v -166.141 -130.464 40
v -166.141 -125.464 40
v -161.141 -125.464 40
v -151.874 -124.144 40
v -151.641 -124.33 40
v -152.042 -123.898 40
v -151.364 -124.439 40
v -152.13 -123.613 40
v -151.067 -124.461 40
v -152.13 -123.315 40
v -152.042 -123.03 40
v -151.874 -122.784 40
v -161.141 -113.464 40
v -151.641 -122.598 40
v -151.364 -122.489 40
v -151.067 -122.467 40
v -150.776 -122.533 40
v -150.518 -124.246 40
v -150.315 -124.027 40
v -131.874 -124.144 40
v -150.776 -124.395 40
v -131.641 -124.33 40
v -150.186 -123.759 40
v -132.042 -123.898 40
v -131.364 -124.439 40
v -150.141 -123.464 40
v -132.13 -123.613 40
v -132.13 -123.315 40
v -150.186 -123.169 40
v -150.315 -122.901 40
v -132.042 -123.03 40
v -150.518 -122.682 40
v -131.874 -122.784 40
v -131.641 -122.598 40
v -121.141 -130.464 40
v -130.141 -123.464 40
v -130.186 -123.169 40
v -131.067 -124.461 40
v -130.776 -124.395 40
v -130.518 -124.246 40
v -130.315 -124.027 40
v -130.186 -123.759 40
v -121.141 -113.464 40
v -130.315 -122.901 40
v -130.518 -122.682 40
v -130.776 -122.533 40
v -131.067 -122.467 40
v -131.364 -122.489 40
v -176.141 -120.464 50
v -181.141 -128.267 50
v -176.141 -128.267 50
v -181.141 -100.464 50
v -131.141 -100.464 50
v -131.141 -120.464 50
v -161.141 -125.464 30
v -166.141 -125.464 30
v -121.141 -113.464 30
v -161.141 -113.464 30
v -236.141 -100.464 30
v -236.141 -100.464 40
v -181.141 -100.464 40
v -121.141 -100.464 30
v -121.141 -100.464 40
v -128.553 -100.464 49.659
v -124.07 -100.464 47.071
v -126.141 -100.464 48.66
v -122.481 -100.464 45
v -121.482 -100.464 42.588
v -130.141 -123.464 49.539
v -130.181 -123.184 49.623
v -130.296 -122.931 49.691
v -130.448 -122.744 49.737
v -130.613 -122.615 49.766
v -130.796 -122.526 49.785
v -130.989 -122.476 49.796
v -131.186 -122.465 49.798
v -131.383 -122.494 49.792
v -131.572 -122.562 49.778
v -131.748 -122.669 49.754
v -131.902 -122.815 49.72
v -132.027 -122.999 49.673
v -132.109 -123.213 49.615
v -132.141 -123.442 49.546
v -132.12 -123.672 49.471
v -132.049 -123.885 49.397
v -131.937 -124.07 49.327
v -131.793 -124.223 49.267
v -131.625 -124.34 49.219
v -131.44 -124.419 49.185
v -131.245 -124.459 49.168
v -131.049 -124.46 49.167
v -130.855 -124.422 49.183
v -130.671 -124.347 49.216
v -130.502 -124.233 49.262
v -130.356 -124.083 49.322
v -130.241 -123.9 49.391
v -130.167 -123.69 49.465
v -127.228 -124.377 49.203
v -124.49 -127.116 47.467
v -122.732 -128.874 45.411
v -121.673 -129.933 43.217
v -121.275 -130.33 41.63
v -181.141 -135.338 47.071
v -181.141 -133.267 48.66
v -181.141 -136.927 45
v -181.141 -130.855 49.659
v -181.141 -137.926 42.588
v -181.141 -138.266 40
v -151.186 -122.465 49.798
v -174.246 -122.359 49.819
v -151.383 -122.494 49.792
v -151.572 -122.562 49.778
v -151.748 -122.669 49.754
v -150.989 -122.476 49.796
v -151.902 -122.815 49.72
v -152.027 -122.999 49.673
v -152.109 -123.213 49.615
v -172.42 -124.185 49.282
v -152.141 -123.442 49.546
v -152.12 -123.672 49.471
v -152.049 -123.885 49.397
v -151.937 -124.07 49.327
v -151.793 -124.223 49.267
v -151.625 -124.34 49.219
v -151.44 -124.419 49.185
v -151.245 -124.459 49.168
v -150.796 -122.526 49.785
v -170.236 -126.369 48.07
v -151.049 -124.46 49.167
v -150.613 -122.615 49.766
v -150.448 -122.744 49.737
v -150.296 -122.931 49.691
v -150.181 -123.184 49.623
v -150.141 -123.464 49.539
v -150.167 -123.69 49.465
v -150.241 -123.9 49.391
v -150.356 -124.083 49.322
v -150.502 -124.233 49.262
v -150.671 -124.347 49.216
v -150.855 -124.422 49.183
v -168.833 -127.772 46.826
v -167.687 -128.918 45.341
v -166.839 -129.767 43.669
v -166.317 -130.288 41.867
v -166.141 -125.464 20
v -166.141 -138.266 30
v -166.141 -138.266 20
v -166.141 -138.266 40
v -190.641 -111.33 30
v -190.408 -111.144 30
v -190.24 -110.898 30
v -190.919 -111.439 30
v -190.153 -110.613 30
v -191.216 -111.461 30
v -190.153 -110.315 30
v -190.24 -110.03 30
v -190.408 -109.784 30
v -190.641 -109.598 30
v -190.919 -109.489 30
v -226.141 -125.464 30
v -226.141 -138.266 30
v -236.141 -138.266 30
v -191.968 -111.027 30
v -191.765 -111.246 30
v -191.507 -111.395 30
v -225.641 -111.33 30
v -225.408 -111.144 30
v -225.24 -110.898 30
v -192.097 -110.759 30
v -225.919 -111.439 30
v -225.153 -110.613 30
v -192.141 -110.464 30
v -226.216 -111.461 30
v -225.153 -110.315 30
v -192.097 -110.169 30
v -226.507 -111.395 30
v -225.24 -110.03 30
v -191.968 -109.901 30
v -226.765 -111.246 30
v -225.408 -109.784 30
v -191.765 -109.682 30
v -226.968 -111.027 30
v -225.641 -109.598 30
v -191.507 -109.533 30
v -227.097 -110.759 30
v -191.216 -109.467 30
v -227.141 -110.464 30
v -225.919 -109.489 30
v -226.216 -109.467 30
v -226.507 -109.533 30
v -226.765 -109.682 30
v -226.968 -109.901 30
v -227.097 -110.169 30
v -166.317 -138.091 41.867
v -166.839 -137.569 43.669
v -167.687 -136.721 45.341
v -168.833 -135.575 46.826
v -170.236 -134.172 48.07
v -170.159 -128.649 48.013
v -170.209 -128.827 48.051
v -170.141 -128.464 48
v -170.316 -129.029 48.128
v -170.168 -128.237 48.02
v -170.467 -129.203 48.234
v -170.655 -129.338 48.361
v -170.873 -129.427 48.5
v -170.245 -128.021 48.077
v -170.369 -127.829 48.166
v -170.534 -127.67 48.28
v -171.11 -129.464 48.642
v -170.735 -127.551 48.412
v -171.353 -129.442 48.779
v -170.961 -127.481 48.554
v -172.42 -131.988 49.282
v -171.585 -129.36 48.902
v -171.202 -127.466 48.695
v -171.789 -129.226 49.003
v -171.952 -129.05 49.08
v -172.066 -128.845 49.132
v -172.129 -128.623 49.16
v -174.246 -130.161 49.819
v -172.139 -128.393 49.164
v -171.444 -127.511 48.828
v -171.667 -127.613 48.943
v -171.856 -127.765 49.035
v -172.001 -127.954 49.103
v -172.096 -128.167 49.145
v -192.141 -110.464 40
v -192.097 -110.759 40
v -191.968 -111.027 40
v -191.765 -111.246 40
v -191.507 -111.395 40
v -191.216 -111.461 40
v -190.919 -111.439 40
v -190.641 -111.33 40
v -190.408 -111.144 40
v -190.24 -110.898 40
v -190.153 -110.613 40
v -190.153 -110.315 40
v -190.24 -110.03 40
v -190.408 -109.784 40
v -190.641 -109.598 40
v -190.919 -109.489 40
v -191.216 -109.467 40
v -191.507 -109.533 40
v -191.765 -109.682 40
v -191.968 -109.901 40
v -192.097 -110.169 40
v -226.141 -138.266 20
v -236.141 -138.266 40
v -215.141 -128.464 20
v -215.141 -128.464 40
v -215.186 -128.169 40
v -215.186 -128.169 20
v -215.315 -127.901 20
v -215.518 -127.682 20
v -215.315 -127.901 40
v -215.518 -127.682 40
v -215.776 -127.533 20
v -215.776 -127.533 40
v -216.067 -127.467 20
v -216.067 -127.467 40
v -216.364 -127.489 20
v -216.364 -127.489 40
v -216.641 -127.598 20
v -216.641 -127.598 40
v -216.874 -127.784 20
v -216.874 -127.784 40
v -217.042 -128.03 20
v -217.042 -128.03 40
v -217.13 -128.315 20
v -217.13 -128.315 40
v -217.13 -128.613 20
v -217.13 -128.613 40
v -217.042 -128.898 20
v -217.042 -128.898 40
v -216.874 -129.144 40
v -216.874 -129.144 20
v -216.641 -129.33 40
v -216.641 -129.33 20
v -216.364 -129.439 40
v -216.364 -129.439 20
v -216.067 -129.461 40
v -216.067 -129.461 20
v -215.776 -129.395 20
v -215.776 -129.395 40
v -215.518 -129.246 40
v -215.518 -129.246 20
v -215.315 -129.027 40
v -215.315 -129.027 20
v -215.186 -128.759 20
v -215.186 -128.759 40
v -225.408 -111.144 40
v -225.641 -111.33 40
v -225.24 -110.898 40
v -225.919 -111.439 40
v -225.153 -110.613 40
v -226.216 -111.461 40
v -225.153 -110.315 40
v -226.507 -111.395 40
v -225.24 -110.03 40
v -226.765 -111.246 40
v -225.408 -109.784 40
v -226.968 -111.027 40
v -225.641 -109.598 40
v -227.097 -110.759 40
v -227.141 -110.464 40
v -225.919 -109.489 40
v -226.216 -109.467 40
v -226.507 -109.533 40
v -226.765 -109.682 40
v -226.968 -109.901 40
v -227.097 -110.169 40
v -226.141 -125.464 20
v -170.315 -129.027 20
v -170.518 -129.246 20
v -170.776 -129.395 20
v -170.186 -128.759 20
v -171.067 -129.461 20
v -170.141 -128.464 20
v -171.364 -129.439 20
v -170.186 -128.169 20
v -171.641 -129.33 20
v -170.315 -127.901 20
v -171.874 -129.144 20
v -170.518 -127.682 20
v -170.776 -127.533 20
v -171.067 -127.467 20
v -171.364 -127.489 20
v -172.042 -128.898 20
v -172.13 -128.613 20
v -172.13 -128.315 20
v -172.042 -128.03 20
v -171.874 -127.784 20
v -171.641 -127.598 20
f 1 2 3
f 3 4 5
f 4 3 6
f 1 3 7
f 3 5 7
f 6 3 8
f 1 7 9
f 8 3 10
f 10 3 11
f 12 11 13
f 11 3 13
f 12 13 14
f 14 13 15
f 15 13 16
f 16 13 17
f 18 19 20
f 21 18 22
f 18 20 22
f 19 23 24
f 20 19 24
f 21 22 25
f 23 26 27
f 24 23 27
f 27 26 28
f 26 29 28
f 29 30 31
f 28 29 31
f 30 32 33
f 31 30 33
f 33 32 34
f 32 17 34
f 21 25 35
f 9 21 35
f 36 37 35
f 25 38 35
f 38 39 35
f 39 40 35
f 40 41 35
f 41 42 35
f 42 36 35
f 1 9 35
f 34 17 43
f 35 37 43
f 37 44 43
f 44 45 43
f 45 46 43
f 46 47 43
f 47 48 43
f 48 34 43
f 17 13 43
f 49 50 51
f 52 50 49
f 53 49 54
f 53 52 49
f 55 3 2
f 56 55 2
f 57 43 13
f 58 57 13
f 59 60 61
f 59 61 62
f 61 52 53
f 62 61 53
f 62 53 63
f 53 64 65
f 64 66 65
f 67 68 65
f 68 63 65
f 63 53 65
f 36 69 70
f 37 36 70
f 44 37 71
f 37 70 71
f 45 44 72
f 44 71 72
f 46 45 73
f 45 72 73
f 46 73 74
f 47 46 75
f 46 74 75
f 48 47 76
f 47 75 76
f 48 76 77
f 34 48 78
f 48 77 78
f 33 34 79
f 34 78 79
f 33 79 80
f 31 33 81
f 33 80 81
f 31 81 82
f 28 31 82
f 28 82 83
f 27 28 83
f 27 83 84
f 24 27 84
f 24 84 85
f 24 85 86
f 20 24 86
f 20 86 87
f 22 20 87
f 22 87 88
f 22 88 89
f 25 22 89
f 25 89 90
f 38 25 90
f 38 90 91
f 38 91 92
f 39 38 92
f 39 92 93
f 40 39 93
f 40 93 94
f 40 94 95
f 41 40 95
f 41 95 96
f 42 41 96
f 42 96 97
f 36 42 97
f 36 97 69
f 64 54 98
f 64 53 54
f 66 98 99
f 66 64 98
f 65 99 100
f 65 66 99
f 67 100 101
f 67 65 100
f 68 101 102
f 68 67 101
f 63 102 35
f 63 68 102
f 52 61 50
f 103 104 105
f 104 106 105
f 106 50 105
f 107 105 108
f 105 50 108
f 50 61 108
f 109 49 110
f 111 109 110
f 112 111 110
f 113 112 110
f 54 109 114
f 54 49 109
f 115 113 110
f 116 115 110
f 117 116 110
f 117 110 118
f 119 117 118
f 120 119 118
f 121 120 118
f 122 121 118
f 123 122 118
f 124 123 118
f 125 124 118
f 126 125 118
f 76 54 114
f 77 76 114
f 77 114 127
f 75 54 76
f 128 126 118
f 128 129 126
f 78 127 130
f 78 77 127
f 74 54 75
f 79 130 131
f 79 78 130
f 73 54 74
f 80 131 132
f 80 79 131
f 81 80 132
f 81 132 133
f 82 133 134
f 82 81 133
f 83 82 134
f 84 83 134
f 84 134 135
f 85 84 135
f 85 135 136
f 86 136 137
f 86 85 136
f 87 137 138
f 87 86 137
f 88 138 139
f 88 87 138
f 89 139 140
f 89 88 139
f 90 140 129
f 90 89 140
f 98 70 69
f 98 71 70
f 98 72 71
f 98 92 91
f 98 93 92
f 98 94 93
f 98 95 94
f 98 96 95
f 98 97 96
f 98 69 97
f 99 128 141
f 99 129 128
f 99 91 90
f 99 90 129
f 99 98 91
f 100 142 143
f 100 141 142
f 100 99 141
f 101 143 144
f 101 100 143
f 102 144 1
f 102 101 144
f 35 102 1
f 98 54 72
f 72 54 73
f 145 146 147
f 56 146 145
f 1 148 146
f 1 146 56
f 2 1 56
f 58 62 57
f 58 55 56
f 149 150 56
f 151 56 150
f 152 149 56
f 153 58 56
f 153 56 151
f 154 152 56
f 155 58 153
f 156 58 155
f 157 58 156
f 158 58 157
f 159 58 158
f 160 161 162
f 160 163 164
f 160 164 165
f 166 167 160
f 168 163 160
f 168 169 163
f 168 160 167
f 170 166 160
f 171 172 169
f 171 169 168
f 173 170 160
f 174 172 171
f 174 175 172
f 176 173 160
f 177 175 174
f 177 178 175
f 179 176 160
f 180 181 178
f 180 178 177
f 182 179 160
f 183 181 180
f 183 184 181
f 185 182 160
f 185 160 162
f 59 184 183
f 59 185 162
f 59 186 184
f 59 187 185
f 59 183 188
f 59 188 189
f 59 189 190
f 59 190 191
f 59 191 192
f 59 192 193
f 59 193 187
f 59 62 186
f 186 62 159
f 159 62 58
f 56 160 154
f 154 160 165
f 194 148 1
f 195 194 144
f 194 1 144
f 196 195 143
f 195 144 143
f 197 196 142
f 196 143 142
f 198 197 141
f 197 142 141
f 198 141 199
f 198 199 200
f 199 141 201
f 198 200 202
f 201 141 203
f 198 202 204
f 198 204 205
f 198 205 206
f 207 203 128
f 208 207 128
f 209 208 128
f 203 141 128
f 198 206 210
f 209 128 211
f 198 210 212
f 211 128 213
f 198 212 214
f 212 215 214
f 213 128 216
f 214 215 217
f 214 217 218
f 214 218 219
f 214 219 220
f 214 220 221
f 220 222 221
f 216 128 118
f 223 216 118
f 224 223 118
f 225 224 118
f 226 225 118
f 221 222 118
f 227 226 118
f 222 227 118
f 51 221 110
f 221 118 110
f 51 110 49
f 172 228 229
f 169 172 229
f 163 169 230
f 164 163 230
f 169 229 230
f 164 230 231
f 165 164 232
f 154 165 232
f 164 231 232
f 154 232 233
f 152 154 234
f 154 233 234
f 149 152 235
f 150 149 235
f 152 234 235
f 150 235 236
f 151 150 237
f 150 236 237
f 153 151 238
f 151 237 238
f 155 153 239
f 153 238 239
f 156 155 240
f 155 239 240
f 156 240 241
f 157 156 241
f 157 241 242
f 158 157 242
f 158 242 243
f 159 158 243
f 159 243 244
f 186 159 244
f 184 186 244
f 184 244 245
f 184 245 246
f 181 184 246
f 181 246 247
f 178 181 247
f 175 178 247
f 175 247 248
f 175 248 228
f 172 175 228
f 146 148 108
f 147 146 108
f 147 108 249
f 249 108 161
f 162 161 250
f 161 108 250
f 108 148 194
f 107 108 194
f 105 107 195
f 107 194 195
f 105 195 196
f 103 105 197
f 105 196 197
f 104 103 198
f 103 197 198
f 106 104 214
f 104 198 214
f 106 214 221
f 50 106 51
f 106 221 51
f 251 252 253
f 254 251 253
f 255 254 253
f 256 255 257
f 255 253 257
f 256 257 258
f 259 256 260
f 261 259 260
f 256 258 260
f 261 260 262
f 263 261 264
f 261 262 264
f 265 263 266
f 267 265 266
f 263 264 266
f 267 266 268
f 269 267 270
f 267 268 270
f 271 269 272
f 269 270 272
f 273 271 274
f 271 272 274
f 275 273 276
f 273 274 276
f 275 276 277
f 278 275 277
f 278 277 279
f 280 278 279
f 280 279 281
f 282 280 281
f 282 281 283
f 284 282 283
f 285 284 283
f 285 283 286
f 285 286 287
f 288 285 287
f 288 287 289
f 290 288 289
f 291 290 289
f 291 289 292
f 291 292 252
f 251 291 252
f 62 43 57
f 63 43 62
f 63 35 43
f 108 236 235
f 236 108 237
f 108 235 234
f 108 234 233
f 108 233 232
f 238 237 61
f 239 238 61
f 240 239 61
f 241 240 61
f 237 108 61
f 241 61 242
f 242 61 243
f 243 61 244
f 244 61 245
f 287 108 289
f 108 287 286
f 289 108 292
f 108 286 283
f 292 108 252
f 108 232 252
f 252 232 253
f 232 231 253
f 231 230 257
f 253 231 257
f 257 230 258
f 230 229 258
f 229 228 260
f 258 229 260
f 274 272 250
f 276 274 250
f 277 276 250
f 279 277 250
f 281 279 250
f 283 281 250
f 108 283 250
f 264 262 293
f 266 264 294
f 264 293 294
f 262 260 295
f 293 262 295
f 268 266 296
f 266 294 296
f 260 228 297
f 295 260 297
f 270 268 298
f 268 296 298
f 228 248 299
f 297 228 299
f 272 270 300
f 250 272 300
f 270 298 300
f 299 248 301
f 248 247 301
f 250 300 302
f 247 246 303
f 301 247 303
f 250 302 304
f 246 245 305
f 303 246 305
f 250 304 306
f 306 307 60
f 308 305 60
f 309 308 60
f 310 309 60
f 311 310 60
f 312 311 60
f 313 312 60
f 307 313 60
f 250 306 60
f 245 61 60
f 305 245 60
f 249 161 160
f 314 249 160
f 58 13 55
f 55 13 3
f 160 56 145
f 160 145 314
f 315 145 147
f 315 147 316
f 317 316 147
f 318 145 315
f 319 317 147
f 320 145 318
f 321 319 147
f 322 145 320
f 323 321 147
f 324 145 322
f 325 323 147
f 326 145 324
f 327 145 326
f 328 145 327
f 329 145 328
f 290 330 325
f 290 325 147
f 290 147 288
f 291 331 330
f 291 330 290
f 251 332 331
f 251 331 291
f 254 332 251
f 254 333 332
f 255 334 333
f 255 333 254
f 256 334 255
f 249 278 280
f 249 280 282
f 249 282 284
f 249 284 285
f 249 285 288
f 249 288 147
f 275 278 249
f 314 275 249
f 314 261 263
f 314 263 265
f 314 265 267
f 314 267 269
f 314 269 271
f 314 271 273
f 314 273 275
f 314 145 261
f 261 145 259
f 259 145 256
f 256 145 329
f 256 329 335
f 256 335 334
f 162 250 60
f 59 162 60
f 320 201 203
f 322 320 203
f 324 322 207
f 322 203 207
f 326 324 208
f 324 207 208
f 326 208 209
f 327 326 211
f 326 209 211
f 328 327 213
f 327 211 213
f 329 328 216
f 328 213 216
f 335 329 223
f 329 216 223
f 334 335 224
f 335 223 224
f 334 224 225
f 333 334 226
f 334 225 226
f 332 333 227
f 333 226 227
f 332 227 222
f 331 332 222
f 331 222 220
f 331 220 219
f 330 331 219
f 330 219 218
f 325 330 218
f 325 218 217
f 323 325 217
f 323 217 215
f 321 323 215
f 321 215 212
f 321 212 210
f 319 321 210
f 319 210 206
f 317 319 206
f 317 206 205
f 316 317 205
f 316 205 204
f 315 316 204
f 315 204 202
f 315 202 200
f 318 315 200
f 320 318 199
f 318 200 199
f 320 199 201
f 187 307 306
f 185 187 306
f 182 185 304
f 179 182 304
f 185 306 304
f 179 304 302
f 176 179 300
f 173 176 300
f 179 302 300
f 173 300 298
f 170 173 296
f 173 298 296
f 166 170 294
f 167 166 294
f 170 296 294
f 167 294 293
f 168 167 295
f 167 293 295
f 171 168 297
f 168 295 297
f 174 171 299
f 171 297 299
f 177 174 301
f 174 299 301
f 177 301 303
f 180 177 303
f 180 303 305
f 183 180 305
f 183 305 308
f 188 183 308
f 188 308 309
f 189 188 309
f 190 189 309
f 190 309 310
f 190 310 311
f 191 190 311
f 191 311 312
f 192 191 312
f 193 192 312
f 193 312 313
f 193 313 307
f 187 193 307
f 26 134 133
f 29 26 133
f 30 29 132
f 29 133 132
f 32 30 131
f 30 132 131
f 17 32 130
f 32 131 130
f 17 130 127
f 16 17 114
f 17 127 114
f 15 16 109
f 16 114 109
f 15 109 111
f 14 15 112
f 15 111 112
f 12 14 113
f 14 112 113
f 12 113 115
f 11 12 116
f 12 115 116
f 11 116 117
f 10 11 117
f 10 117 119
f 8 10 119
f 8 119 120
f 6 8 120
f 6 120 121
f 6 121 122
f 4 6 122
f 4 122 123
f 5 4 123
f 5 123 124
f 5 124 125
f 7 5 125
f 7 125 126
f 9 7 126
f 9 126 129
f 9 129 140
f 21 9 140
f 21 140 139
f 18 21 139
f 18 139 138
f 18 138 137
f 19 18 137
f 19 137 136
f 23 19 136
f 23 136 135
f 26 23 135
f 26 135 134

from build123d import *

# Parameters (mm, degrees)
ESQUISSE1_W             = 15
ESQUISSE1_H             = 7.802319197
BOSS_EXTRU_1_DEPTH      = 10
ESQUISSE2_W             = 55
ESQUISSE2_H             = 12.802319197
ESQUISSE2_W_2           = 40
ESQUISSE2_H_2           = 13
ESQUISSE2_H_3           = 25
BOSS_EXTRU_2_DEPTH      = 10
ESQUISSE3_W             = 60
ESQUISSE3_H             = 12.802319197
BOSS_EXTRU_3_DEPTH      = 10
CONG_1_R                = 10
ESQUISSE4_R             = 1
ENL_V_MAT_EXTRU_1_DEPTH = 276.282402739


with BuildPart() as part:
    # Esquisse1 → Boss.-Extru.1 (new body)
    with BuildSketch(Plane.XY.offset(40)):
        Polygon((-166.141434162, -130.464178298), (-121.141434162, -130.464178298), (-121.141434162, -100.464178298), (-181.141434162, -100.464178298), (-181.141434162, -130.464178298), align=None)
        with Locations((-173.641434162, -134.365337897)):
            Rectangle(ESQUISSE1_W, ESQUISSE1_H)
    extrude(amount=BOSS_EXTRU_1_DEPTH)

    # Esquisse2 → Boss.-Extru.2 (add)
    with BuildSketch(Plane(origin=(0, 0, 40), x_dir=(-1, 0, 0), z_dir=(0, 0, -1))):
        with Locations((208.641434162, -131.865337897)):
            Rectangle(ESQUISSE2_W, ESQUISSE2_H)
        Polygon((181.141434162, -138.266497495), (181.141434162, -125.464178298), (166.141434162, -125.464178298), (166.141434162, -130.464178298), (166.141434162, -138.266497495), align=None)
        Polygon((181.141434162, -100.464178298), (161.141434162, -100.464178298), (161.141434162, -113.464178298), (161.141434162, -125.464178298), (166.141434162, -125.464178298), (181.141434162, -125.464178298), align=None)
        with Locations((141.141434162, -106.964178298)):
            Rectangle(ESQUISSE2_W_2, ESQUISSE2_H_2)
        with Locations((208.641434162, -112.964178298)):
            Rectangle(ESQUISSE2_W, ESQUISSE2_H_3)
    extrude(amount=BOSS_EXTRU_2_DEPTH)

    # Esquisse3 → Boss.-Extru.3 (add)
    with BuildSketch(Plane(origin=(0, 0, 30), x_dir=(-1, 0, 0), z_dir=(0, 0, -1))):
        with Locations((196.141434162, -131.865337897)):
            Rectangle(ESQUISSE3_W, ESQUISSE3_H)
    extrude(amount=BOSS_EXTRU_3_DEPTH)

    # Congé1
    cong_1_edges = [part.edges().sort_by_distance(p)[0] for p in [
        (-121.141434162, -115.464178298, 50),
        (-173.641434162, -138.266497495, 50),
        (-166.141434162, -134.365337896, 50),
        (-143.641434162, -130.464178298, 50),
    ]]
    fillet(cong_1_edges, radius=CONG_1_R - 0.0001)  # a hair under: the kernel refuses the full size

    # Esquisse4 → Enlèv. mat.-Extru.1 (cut, through all)
    with BuildSketch(Plane.XY.offset(50)):
        with Locations((-151.141434162, -123.464178298)):
            Circle(ESQUISSE4_R)
        with Locations((-131.141434162, -123.464178298)):
            Circle(ESQUISSE4_R)
        with Locations((-171.141434162, -128.464178298)):
            Circle(ESQUISSE4_R)
        with Locations((-216.141434162, -128.464178298)):
            Circle(ESQUISSE4_R)
        with Locations(Location((-226.141434162, -110.464178298, 0), (0, 0, 180))):
            Circle(ESQUISSE4_R)
        with Locations(Location((-191.141434162, -110.464178298, 0), (0, 0, 180))):
            Circle(ESQUISSE4_R)
    extrude(amount=-ENL_V_MAT_EXTRU_1_DEPTH, mode=Mode.SUBTRACT)


solid = part.part
